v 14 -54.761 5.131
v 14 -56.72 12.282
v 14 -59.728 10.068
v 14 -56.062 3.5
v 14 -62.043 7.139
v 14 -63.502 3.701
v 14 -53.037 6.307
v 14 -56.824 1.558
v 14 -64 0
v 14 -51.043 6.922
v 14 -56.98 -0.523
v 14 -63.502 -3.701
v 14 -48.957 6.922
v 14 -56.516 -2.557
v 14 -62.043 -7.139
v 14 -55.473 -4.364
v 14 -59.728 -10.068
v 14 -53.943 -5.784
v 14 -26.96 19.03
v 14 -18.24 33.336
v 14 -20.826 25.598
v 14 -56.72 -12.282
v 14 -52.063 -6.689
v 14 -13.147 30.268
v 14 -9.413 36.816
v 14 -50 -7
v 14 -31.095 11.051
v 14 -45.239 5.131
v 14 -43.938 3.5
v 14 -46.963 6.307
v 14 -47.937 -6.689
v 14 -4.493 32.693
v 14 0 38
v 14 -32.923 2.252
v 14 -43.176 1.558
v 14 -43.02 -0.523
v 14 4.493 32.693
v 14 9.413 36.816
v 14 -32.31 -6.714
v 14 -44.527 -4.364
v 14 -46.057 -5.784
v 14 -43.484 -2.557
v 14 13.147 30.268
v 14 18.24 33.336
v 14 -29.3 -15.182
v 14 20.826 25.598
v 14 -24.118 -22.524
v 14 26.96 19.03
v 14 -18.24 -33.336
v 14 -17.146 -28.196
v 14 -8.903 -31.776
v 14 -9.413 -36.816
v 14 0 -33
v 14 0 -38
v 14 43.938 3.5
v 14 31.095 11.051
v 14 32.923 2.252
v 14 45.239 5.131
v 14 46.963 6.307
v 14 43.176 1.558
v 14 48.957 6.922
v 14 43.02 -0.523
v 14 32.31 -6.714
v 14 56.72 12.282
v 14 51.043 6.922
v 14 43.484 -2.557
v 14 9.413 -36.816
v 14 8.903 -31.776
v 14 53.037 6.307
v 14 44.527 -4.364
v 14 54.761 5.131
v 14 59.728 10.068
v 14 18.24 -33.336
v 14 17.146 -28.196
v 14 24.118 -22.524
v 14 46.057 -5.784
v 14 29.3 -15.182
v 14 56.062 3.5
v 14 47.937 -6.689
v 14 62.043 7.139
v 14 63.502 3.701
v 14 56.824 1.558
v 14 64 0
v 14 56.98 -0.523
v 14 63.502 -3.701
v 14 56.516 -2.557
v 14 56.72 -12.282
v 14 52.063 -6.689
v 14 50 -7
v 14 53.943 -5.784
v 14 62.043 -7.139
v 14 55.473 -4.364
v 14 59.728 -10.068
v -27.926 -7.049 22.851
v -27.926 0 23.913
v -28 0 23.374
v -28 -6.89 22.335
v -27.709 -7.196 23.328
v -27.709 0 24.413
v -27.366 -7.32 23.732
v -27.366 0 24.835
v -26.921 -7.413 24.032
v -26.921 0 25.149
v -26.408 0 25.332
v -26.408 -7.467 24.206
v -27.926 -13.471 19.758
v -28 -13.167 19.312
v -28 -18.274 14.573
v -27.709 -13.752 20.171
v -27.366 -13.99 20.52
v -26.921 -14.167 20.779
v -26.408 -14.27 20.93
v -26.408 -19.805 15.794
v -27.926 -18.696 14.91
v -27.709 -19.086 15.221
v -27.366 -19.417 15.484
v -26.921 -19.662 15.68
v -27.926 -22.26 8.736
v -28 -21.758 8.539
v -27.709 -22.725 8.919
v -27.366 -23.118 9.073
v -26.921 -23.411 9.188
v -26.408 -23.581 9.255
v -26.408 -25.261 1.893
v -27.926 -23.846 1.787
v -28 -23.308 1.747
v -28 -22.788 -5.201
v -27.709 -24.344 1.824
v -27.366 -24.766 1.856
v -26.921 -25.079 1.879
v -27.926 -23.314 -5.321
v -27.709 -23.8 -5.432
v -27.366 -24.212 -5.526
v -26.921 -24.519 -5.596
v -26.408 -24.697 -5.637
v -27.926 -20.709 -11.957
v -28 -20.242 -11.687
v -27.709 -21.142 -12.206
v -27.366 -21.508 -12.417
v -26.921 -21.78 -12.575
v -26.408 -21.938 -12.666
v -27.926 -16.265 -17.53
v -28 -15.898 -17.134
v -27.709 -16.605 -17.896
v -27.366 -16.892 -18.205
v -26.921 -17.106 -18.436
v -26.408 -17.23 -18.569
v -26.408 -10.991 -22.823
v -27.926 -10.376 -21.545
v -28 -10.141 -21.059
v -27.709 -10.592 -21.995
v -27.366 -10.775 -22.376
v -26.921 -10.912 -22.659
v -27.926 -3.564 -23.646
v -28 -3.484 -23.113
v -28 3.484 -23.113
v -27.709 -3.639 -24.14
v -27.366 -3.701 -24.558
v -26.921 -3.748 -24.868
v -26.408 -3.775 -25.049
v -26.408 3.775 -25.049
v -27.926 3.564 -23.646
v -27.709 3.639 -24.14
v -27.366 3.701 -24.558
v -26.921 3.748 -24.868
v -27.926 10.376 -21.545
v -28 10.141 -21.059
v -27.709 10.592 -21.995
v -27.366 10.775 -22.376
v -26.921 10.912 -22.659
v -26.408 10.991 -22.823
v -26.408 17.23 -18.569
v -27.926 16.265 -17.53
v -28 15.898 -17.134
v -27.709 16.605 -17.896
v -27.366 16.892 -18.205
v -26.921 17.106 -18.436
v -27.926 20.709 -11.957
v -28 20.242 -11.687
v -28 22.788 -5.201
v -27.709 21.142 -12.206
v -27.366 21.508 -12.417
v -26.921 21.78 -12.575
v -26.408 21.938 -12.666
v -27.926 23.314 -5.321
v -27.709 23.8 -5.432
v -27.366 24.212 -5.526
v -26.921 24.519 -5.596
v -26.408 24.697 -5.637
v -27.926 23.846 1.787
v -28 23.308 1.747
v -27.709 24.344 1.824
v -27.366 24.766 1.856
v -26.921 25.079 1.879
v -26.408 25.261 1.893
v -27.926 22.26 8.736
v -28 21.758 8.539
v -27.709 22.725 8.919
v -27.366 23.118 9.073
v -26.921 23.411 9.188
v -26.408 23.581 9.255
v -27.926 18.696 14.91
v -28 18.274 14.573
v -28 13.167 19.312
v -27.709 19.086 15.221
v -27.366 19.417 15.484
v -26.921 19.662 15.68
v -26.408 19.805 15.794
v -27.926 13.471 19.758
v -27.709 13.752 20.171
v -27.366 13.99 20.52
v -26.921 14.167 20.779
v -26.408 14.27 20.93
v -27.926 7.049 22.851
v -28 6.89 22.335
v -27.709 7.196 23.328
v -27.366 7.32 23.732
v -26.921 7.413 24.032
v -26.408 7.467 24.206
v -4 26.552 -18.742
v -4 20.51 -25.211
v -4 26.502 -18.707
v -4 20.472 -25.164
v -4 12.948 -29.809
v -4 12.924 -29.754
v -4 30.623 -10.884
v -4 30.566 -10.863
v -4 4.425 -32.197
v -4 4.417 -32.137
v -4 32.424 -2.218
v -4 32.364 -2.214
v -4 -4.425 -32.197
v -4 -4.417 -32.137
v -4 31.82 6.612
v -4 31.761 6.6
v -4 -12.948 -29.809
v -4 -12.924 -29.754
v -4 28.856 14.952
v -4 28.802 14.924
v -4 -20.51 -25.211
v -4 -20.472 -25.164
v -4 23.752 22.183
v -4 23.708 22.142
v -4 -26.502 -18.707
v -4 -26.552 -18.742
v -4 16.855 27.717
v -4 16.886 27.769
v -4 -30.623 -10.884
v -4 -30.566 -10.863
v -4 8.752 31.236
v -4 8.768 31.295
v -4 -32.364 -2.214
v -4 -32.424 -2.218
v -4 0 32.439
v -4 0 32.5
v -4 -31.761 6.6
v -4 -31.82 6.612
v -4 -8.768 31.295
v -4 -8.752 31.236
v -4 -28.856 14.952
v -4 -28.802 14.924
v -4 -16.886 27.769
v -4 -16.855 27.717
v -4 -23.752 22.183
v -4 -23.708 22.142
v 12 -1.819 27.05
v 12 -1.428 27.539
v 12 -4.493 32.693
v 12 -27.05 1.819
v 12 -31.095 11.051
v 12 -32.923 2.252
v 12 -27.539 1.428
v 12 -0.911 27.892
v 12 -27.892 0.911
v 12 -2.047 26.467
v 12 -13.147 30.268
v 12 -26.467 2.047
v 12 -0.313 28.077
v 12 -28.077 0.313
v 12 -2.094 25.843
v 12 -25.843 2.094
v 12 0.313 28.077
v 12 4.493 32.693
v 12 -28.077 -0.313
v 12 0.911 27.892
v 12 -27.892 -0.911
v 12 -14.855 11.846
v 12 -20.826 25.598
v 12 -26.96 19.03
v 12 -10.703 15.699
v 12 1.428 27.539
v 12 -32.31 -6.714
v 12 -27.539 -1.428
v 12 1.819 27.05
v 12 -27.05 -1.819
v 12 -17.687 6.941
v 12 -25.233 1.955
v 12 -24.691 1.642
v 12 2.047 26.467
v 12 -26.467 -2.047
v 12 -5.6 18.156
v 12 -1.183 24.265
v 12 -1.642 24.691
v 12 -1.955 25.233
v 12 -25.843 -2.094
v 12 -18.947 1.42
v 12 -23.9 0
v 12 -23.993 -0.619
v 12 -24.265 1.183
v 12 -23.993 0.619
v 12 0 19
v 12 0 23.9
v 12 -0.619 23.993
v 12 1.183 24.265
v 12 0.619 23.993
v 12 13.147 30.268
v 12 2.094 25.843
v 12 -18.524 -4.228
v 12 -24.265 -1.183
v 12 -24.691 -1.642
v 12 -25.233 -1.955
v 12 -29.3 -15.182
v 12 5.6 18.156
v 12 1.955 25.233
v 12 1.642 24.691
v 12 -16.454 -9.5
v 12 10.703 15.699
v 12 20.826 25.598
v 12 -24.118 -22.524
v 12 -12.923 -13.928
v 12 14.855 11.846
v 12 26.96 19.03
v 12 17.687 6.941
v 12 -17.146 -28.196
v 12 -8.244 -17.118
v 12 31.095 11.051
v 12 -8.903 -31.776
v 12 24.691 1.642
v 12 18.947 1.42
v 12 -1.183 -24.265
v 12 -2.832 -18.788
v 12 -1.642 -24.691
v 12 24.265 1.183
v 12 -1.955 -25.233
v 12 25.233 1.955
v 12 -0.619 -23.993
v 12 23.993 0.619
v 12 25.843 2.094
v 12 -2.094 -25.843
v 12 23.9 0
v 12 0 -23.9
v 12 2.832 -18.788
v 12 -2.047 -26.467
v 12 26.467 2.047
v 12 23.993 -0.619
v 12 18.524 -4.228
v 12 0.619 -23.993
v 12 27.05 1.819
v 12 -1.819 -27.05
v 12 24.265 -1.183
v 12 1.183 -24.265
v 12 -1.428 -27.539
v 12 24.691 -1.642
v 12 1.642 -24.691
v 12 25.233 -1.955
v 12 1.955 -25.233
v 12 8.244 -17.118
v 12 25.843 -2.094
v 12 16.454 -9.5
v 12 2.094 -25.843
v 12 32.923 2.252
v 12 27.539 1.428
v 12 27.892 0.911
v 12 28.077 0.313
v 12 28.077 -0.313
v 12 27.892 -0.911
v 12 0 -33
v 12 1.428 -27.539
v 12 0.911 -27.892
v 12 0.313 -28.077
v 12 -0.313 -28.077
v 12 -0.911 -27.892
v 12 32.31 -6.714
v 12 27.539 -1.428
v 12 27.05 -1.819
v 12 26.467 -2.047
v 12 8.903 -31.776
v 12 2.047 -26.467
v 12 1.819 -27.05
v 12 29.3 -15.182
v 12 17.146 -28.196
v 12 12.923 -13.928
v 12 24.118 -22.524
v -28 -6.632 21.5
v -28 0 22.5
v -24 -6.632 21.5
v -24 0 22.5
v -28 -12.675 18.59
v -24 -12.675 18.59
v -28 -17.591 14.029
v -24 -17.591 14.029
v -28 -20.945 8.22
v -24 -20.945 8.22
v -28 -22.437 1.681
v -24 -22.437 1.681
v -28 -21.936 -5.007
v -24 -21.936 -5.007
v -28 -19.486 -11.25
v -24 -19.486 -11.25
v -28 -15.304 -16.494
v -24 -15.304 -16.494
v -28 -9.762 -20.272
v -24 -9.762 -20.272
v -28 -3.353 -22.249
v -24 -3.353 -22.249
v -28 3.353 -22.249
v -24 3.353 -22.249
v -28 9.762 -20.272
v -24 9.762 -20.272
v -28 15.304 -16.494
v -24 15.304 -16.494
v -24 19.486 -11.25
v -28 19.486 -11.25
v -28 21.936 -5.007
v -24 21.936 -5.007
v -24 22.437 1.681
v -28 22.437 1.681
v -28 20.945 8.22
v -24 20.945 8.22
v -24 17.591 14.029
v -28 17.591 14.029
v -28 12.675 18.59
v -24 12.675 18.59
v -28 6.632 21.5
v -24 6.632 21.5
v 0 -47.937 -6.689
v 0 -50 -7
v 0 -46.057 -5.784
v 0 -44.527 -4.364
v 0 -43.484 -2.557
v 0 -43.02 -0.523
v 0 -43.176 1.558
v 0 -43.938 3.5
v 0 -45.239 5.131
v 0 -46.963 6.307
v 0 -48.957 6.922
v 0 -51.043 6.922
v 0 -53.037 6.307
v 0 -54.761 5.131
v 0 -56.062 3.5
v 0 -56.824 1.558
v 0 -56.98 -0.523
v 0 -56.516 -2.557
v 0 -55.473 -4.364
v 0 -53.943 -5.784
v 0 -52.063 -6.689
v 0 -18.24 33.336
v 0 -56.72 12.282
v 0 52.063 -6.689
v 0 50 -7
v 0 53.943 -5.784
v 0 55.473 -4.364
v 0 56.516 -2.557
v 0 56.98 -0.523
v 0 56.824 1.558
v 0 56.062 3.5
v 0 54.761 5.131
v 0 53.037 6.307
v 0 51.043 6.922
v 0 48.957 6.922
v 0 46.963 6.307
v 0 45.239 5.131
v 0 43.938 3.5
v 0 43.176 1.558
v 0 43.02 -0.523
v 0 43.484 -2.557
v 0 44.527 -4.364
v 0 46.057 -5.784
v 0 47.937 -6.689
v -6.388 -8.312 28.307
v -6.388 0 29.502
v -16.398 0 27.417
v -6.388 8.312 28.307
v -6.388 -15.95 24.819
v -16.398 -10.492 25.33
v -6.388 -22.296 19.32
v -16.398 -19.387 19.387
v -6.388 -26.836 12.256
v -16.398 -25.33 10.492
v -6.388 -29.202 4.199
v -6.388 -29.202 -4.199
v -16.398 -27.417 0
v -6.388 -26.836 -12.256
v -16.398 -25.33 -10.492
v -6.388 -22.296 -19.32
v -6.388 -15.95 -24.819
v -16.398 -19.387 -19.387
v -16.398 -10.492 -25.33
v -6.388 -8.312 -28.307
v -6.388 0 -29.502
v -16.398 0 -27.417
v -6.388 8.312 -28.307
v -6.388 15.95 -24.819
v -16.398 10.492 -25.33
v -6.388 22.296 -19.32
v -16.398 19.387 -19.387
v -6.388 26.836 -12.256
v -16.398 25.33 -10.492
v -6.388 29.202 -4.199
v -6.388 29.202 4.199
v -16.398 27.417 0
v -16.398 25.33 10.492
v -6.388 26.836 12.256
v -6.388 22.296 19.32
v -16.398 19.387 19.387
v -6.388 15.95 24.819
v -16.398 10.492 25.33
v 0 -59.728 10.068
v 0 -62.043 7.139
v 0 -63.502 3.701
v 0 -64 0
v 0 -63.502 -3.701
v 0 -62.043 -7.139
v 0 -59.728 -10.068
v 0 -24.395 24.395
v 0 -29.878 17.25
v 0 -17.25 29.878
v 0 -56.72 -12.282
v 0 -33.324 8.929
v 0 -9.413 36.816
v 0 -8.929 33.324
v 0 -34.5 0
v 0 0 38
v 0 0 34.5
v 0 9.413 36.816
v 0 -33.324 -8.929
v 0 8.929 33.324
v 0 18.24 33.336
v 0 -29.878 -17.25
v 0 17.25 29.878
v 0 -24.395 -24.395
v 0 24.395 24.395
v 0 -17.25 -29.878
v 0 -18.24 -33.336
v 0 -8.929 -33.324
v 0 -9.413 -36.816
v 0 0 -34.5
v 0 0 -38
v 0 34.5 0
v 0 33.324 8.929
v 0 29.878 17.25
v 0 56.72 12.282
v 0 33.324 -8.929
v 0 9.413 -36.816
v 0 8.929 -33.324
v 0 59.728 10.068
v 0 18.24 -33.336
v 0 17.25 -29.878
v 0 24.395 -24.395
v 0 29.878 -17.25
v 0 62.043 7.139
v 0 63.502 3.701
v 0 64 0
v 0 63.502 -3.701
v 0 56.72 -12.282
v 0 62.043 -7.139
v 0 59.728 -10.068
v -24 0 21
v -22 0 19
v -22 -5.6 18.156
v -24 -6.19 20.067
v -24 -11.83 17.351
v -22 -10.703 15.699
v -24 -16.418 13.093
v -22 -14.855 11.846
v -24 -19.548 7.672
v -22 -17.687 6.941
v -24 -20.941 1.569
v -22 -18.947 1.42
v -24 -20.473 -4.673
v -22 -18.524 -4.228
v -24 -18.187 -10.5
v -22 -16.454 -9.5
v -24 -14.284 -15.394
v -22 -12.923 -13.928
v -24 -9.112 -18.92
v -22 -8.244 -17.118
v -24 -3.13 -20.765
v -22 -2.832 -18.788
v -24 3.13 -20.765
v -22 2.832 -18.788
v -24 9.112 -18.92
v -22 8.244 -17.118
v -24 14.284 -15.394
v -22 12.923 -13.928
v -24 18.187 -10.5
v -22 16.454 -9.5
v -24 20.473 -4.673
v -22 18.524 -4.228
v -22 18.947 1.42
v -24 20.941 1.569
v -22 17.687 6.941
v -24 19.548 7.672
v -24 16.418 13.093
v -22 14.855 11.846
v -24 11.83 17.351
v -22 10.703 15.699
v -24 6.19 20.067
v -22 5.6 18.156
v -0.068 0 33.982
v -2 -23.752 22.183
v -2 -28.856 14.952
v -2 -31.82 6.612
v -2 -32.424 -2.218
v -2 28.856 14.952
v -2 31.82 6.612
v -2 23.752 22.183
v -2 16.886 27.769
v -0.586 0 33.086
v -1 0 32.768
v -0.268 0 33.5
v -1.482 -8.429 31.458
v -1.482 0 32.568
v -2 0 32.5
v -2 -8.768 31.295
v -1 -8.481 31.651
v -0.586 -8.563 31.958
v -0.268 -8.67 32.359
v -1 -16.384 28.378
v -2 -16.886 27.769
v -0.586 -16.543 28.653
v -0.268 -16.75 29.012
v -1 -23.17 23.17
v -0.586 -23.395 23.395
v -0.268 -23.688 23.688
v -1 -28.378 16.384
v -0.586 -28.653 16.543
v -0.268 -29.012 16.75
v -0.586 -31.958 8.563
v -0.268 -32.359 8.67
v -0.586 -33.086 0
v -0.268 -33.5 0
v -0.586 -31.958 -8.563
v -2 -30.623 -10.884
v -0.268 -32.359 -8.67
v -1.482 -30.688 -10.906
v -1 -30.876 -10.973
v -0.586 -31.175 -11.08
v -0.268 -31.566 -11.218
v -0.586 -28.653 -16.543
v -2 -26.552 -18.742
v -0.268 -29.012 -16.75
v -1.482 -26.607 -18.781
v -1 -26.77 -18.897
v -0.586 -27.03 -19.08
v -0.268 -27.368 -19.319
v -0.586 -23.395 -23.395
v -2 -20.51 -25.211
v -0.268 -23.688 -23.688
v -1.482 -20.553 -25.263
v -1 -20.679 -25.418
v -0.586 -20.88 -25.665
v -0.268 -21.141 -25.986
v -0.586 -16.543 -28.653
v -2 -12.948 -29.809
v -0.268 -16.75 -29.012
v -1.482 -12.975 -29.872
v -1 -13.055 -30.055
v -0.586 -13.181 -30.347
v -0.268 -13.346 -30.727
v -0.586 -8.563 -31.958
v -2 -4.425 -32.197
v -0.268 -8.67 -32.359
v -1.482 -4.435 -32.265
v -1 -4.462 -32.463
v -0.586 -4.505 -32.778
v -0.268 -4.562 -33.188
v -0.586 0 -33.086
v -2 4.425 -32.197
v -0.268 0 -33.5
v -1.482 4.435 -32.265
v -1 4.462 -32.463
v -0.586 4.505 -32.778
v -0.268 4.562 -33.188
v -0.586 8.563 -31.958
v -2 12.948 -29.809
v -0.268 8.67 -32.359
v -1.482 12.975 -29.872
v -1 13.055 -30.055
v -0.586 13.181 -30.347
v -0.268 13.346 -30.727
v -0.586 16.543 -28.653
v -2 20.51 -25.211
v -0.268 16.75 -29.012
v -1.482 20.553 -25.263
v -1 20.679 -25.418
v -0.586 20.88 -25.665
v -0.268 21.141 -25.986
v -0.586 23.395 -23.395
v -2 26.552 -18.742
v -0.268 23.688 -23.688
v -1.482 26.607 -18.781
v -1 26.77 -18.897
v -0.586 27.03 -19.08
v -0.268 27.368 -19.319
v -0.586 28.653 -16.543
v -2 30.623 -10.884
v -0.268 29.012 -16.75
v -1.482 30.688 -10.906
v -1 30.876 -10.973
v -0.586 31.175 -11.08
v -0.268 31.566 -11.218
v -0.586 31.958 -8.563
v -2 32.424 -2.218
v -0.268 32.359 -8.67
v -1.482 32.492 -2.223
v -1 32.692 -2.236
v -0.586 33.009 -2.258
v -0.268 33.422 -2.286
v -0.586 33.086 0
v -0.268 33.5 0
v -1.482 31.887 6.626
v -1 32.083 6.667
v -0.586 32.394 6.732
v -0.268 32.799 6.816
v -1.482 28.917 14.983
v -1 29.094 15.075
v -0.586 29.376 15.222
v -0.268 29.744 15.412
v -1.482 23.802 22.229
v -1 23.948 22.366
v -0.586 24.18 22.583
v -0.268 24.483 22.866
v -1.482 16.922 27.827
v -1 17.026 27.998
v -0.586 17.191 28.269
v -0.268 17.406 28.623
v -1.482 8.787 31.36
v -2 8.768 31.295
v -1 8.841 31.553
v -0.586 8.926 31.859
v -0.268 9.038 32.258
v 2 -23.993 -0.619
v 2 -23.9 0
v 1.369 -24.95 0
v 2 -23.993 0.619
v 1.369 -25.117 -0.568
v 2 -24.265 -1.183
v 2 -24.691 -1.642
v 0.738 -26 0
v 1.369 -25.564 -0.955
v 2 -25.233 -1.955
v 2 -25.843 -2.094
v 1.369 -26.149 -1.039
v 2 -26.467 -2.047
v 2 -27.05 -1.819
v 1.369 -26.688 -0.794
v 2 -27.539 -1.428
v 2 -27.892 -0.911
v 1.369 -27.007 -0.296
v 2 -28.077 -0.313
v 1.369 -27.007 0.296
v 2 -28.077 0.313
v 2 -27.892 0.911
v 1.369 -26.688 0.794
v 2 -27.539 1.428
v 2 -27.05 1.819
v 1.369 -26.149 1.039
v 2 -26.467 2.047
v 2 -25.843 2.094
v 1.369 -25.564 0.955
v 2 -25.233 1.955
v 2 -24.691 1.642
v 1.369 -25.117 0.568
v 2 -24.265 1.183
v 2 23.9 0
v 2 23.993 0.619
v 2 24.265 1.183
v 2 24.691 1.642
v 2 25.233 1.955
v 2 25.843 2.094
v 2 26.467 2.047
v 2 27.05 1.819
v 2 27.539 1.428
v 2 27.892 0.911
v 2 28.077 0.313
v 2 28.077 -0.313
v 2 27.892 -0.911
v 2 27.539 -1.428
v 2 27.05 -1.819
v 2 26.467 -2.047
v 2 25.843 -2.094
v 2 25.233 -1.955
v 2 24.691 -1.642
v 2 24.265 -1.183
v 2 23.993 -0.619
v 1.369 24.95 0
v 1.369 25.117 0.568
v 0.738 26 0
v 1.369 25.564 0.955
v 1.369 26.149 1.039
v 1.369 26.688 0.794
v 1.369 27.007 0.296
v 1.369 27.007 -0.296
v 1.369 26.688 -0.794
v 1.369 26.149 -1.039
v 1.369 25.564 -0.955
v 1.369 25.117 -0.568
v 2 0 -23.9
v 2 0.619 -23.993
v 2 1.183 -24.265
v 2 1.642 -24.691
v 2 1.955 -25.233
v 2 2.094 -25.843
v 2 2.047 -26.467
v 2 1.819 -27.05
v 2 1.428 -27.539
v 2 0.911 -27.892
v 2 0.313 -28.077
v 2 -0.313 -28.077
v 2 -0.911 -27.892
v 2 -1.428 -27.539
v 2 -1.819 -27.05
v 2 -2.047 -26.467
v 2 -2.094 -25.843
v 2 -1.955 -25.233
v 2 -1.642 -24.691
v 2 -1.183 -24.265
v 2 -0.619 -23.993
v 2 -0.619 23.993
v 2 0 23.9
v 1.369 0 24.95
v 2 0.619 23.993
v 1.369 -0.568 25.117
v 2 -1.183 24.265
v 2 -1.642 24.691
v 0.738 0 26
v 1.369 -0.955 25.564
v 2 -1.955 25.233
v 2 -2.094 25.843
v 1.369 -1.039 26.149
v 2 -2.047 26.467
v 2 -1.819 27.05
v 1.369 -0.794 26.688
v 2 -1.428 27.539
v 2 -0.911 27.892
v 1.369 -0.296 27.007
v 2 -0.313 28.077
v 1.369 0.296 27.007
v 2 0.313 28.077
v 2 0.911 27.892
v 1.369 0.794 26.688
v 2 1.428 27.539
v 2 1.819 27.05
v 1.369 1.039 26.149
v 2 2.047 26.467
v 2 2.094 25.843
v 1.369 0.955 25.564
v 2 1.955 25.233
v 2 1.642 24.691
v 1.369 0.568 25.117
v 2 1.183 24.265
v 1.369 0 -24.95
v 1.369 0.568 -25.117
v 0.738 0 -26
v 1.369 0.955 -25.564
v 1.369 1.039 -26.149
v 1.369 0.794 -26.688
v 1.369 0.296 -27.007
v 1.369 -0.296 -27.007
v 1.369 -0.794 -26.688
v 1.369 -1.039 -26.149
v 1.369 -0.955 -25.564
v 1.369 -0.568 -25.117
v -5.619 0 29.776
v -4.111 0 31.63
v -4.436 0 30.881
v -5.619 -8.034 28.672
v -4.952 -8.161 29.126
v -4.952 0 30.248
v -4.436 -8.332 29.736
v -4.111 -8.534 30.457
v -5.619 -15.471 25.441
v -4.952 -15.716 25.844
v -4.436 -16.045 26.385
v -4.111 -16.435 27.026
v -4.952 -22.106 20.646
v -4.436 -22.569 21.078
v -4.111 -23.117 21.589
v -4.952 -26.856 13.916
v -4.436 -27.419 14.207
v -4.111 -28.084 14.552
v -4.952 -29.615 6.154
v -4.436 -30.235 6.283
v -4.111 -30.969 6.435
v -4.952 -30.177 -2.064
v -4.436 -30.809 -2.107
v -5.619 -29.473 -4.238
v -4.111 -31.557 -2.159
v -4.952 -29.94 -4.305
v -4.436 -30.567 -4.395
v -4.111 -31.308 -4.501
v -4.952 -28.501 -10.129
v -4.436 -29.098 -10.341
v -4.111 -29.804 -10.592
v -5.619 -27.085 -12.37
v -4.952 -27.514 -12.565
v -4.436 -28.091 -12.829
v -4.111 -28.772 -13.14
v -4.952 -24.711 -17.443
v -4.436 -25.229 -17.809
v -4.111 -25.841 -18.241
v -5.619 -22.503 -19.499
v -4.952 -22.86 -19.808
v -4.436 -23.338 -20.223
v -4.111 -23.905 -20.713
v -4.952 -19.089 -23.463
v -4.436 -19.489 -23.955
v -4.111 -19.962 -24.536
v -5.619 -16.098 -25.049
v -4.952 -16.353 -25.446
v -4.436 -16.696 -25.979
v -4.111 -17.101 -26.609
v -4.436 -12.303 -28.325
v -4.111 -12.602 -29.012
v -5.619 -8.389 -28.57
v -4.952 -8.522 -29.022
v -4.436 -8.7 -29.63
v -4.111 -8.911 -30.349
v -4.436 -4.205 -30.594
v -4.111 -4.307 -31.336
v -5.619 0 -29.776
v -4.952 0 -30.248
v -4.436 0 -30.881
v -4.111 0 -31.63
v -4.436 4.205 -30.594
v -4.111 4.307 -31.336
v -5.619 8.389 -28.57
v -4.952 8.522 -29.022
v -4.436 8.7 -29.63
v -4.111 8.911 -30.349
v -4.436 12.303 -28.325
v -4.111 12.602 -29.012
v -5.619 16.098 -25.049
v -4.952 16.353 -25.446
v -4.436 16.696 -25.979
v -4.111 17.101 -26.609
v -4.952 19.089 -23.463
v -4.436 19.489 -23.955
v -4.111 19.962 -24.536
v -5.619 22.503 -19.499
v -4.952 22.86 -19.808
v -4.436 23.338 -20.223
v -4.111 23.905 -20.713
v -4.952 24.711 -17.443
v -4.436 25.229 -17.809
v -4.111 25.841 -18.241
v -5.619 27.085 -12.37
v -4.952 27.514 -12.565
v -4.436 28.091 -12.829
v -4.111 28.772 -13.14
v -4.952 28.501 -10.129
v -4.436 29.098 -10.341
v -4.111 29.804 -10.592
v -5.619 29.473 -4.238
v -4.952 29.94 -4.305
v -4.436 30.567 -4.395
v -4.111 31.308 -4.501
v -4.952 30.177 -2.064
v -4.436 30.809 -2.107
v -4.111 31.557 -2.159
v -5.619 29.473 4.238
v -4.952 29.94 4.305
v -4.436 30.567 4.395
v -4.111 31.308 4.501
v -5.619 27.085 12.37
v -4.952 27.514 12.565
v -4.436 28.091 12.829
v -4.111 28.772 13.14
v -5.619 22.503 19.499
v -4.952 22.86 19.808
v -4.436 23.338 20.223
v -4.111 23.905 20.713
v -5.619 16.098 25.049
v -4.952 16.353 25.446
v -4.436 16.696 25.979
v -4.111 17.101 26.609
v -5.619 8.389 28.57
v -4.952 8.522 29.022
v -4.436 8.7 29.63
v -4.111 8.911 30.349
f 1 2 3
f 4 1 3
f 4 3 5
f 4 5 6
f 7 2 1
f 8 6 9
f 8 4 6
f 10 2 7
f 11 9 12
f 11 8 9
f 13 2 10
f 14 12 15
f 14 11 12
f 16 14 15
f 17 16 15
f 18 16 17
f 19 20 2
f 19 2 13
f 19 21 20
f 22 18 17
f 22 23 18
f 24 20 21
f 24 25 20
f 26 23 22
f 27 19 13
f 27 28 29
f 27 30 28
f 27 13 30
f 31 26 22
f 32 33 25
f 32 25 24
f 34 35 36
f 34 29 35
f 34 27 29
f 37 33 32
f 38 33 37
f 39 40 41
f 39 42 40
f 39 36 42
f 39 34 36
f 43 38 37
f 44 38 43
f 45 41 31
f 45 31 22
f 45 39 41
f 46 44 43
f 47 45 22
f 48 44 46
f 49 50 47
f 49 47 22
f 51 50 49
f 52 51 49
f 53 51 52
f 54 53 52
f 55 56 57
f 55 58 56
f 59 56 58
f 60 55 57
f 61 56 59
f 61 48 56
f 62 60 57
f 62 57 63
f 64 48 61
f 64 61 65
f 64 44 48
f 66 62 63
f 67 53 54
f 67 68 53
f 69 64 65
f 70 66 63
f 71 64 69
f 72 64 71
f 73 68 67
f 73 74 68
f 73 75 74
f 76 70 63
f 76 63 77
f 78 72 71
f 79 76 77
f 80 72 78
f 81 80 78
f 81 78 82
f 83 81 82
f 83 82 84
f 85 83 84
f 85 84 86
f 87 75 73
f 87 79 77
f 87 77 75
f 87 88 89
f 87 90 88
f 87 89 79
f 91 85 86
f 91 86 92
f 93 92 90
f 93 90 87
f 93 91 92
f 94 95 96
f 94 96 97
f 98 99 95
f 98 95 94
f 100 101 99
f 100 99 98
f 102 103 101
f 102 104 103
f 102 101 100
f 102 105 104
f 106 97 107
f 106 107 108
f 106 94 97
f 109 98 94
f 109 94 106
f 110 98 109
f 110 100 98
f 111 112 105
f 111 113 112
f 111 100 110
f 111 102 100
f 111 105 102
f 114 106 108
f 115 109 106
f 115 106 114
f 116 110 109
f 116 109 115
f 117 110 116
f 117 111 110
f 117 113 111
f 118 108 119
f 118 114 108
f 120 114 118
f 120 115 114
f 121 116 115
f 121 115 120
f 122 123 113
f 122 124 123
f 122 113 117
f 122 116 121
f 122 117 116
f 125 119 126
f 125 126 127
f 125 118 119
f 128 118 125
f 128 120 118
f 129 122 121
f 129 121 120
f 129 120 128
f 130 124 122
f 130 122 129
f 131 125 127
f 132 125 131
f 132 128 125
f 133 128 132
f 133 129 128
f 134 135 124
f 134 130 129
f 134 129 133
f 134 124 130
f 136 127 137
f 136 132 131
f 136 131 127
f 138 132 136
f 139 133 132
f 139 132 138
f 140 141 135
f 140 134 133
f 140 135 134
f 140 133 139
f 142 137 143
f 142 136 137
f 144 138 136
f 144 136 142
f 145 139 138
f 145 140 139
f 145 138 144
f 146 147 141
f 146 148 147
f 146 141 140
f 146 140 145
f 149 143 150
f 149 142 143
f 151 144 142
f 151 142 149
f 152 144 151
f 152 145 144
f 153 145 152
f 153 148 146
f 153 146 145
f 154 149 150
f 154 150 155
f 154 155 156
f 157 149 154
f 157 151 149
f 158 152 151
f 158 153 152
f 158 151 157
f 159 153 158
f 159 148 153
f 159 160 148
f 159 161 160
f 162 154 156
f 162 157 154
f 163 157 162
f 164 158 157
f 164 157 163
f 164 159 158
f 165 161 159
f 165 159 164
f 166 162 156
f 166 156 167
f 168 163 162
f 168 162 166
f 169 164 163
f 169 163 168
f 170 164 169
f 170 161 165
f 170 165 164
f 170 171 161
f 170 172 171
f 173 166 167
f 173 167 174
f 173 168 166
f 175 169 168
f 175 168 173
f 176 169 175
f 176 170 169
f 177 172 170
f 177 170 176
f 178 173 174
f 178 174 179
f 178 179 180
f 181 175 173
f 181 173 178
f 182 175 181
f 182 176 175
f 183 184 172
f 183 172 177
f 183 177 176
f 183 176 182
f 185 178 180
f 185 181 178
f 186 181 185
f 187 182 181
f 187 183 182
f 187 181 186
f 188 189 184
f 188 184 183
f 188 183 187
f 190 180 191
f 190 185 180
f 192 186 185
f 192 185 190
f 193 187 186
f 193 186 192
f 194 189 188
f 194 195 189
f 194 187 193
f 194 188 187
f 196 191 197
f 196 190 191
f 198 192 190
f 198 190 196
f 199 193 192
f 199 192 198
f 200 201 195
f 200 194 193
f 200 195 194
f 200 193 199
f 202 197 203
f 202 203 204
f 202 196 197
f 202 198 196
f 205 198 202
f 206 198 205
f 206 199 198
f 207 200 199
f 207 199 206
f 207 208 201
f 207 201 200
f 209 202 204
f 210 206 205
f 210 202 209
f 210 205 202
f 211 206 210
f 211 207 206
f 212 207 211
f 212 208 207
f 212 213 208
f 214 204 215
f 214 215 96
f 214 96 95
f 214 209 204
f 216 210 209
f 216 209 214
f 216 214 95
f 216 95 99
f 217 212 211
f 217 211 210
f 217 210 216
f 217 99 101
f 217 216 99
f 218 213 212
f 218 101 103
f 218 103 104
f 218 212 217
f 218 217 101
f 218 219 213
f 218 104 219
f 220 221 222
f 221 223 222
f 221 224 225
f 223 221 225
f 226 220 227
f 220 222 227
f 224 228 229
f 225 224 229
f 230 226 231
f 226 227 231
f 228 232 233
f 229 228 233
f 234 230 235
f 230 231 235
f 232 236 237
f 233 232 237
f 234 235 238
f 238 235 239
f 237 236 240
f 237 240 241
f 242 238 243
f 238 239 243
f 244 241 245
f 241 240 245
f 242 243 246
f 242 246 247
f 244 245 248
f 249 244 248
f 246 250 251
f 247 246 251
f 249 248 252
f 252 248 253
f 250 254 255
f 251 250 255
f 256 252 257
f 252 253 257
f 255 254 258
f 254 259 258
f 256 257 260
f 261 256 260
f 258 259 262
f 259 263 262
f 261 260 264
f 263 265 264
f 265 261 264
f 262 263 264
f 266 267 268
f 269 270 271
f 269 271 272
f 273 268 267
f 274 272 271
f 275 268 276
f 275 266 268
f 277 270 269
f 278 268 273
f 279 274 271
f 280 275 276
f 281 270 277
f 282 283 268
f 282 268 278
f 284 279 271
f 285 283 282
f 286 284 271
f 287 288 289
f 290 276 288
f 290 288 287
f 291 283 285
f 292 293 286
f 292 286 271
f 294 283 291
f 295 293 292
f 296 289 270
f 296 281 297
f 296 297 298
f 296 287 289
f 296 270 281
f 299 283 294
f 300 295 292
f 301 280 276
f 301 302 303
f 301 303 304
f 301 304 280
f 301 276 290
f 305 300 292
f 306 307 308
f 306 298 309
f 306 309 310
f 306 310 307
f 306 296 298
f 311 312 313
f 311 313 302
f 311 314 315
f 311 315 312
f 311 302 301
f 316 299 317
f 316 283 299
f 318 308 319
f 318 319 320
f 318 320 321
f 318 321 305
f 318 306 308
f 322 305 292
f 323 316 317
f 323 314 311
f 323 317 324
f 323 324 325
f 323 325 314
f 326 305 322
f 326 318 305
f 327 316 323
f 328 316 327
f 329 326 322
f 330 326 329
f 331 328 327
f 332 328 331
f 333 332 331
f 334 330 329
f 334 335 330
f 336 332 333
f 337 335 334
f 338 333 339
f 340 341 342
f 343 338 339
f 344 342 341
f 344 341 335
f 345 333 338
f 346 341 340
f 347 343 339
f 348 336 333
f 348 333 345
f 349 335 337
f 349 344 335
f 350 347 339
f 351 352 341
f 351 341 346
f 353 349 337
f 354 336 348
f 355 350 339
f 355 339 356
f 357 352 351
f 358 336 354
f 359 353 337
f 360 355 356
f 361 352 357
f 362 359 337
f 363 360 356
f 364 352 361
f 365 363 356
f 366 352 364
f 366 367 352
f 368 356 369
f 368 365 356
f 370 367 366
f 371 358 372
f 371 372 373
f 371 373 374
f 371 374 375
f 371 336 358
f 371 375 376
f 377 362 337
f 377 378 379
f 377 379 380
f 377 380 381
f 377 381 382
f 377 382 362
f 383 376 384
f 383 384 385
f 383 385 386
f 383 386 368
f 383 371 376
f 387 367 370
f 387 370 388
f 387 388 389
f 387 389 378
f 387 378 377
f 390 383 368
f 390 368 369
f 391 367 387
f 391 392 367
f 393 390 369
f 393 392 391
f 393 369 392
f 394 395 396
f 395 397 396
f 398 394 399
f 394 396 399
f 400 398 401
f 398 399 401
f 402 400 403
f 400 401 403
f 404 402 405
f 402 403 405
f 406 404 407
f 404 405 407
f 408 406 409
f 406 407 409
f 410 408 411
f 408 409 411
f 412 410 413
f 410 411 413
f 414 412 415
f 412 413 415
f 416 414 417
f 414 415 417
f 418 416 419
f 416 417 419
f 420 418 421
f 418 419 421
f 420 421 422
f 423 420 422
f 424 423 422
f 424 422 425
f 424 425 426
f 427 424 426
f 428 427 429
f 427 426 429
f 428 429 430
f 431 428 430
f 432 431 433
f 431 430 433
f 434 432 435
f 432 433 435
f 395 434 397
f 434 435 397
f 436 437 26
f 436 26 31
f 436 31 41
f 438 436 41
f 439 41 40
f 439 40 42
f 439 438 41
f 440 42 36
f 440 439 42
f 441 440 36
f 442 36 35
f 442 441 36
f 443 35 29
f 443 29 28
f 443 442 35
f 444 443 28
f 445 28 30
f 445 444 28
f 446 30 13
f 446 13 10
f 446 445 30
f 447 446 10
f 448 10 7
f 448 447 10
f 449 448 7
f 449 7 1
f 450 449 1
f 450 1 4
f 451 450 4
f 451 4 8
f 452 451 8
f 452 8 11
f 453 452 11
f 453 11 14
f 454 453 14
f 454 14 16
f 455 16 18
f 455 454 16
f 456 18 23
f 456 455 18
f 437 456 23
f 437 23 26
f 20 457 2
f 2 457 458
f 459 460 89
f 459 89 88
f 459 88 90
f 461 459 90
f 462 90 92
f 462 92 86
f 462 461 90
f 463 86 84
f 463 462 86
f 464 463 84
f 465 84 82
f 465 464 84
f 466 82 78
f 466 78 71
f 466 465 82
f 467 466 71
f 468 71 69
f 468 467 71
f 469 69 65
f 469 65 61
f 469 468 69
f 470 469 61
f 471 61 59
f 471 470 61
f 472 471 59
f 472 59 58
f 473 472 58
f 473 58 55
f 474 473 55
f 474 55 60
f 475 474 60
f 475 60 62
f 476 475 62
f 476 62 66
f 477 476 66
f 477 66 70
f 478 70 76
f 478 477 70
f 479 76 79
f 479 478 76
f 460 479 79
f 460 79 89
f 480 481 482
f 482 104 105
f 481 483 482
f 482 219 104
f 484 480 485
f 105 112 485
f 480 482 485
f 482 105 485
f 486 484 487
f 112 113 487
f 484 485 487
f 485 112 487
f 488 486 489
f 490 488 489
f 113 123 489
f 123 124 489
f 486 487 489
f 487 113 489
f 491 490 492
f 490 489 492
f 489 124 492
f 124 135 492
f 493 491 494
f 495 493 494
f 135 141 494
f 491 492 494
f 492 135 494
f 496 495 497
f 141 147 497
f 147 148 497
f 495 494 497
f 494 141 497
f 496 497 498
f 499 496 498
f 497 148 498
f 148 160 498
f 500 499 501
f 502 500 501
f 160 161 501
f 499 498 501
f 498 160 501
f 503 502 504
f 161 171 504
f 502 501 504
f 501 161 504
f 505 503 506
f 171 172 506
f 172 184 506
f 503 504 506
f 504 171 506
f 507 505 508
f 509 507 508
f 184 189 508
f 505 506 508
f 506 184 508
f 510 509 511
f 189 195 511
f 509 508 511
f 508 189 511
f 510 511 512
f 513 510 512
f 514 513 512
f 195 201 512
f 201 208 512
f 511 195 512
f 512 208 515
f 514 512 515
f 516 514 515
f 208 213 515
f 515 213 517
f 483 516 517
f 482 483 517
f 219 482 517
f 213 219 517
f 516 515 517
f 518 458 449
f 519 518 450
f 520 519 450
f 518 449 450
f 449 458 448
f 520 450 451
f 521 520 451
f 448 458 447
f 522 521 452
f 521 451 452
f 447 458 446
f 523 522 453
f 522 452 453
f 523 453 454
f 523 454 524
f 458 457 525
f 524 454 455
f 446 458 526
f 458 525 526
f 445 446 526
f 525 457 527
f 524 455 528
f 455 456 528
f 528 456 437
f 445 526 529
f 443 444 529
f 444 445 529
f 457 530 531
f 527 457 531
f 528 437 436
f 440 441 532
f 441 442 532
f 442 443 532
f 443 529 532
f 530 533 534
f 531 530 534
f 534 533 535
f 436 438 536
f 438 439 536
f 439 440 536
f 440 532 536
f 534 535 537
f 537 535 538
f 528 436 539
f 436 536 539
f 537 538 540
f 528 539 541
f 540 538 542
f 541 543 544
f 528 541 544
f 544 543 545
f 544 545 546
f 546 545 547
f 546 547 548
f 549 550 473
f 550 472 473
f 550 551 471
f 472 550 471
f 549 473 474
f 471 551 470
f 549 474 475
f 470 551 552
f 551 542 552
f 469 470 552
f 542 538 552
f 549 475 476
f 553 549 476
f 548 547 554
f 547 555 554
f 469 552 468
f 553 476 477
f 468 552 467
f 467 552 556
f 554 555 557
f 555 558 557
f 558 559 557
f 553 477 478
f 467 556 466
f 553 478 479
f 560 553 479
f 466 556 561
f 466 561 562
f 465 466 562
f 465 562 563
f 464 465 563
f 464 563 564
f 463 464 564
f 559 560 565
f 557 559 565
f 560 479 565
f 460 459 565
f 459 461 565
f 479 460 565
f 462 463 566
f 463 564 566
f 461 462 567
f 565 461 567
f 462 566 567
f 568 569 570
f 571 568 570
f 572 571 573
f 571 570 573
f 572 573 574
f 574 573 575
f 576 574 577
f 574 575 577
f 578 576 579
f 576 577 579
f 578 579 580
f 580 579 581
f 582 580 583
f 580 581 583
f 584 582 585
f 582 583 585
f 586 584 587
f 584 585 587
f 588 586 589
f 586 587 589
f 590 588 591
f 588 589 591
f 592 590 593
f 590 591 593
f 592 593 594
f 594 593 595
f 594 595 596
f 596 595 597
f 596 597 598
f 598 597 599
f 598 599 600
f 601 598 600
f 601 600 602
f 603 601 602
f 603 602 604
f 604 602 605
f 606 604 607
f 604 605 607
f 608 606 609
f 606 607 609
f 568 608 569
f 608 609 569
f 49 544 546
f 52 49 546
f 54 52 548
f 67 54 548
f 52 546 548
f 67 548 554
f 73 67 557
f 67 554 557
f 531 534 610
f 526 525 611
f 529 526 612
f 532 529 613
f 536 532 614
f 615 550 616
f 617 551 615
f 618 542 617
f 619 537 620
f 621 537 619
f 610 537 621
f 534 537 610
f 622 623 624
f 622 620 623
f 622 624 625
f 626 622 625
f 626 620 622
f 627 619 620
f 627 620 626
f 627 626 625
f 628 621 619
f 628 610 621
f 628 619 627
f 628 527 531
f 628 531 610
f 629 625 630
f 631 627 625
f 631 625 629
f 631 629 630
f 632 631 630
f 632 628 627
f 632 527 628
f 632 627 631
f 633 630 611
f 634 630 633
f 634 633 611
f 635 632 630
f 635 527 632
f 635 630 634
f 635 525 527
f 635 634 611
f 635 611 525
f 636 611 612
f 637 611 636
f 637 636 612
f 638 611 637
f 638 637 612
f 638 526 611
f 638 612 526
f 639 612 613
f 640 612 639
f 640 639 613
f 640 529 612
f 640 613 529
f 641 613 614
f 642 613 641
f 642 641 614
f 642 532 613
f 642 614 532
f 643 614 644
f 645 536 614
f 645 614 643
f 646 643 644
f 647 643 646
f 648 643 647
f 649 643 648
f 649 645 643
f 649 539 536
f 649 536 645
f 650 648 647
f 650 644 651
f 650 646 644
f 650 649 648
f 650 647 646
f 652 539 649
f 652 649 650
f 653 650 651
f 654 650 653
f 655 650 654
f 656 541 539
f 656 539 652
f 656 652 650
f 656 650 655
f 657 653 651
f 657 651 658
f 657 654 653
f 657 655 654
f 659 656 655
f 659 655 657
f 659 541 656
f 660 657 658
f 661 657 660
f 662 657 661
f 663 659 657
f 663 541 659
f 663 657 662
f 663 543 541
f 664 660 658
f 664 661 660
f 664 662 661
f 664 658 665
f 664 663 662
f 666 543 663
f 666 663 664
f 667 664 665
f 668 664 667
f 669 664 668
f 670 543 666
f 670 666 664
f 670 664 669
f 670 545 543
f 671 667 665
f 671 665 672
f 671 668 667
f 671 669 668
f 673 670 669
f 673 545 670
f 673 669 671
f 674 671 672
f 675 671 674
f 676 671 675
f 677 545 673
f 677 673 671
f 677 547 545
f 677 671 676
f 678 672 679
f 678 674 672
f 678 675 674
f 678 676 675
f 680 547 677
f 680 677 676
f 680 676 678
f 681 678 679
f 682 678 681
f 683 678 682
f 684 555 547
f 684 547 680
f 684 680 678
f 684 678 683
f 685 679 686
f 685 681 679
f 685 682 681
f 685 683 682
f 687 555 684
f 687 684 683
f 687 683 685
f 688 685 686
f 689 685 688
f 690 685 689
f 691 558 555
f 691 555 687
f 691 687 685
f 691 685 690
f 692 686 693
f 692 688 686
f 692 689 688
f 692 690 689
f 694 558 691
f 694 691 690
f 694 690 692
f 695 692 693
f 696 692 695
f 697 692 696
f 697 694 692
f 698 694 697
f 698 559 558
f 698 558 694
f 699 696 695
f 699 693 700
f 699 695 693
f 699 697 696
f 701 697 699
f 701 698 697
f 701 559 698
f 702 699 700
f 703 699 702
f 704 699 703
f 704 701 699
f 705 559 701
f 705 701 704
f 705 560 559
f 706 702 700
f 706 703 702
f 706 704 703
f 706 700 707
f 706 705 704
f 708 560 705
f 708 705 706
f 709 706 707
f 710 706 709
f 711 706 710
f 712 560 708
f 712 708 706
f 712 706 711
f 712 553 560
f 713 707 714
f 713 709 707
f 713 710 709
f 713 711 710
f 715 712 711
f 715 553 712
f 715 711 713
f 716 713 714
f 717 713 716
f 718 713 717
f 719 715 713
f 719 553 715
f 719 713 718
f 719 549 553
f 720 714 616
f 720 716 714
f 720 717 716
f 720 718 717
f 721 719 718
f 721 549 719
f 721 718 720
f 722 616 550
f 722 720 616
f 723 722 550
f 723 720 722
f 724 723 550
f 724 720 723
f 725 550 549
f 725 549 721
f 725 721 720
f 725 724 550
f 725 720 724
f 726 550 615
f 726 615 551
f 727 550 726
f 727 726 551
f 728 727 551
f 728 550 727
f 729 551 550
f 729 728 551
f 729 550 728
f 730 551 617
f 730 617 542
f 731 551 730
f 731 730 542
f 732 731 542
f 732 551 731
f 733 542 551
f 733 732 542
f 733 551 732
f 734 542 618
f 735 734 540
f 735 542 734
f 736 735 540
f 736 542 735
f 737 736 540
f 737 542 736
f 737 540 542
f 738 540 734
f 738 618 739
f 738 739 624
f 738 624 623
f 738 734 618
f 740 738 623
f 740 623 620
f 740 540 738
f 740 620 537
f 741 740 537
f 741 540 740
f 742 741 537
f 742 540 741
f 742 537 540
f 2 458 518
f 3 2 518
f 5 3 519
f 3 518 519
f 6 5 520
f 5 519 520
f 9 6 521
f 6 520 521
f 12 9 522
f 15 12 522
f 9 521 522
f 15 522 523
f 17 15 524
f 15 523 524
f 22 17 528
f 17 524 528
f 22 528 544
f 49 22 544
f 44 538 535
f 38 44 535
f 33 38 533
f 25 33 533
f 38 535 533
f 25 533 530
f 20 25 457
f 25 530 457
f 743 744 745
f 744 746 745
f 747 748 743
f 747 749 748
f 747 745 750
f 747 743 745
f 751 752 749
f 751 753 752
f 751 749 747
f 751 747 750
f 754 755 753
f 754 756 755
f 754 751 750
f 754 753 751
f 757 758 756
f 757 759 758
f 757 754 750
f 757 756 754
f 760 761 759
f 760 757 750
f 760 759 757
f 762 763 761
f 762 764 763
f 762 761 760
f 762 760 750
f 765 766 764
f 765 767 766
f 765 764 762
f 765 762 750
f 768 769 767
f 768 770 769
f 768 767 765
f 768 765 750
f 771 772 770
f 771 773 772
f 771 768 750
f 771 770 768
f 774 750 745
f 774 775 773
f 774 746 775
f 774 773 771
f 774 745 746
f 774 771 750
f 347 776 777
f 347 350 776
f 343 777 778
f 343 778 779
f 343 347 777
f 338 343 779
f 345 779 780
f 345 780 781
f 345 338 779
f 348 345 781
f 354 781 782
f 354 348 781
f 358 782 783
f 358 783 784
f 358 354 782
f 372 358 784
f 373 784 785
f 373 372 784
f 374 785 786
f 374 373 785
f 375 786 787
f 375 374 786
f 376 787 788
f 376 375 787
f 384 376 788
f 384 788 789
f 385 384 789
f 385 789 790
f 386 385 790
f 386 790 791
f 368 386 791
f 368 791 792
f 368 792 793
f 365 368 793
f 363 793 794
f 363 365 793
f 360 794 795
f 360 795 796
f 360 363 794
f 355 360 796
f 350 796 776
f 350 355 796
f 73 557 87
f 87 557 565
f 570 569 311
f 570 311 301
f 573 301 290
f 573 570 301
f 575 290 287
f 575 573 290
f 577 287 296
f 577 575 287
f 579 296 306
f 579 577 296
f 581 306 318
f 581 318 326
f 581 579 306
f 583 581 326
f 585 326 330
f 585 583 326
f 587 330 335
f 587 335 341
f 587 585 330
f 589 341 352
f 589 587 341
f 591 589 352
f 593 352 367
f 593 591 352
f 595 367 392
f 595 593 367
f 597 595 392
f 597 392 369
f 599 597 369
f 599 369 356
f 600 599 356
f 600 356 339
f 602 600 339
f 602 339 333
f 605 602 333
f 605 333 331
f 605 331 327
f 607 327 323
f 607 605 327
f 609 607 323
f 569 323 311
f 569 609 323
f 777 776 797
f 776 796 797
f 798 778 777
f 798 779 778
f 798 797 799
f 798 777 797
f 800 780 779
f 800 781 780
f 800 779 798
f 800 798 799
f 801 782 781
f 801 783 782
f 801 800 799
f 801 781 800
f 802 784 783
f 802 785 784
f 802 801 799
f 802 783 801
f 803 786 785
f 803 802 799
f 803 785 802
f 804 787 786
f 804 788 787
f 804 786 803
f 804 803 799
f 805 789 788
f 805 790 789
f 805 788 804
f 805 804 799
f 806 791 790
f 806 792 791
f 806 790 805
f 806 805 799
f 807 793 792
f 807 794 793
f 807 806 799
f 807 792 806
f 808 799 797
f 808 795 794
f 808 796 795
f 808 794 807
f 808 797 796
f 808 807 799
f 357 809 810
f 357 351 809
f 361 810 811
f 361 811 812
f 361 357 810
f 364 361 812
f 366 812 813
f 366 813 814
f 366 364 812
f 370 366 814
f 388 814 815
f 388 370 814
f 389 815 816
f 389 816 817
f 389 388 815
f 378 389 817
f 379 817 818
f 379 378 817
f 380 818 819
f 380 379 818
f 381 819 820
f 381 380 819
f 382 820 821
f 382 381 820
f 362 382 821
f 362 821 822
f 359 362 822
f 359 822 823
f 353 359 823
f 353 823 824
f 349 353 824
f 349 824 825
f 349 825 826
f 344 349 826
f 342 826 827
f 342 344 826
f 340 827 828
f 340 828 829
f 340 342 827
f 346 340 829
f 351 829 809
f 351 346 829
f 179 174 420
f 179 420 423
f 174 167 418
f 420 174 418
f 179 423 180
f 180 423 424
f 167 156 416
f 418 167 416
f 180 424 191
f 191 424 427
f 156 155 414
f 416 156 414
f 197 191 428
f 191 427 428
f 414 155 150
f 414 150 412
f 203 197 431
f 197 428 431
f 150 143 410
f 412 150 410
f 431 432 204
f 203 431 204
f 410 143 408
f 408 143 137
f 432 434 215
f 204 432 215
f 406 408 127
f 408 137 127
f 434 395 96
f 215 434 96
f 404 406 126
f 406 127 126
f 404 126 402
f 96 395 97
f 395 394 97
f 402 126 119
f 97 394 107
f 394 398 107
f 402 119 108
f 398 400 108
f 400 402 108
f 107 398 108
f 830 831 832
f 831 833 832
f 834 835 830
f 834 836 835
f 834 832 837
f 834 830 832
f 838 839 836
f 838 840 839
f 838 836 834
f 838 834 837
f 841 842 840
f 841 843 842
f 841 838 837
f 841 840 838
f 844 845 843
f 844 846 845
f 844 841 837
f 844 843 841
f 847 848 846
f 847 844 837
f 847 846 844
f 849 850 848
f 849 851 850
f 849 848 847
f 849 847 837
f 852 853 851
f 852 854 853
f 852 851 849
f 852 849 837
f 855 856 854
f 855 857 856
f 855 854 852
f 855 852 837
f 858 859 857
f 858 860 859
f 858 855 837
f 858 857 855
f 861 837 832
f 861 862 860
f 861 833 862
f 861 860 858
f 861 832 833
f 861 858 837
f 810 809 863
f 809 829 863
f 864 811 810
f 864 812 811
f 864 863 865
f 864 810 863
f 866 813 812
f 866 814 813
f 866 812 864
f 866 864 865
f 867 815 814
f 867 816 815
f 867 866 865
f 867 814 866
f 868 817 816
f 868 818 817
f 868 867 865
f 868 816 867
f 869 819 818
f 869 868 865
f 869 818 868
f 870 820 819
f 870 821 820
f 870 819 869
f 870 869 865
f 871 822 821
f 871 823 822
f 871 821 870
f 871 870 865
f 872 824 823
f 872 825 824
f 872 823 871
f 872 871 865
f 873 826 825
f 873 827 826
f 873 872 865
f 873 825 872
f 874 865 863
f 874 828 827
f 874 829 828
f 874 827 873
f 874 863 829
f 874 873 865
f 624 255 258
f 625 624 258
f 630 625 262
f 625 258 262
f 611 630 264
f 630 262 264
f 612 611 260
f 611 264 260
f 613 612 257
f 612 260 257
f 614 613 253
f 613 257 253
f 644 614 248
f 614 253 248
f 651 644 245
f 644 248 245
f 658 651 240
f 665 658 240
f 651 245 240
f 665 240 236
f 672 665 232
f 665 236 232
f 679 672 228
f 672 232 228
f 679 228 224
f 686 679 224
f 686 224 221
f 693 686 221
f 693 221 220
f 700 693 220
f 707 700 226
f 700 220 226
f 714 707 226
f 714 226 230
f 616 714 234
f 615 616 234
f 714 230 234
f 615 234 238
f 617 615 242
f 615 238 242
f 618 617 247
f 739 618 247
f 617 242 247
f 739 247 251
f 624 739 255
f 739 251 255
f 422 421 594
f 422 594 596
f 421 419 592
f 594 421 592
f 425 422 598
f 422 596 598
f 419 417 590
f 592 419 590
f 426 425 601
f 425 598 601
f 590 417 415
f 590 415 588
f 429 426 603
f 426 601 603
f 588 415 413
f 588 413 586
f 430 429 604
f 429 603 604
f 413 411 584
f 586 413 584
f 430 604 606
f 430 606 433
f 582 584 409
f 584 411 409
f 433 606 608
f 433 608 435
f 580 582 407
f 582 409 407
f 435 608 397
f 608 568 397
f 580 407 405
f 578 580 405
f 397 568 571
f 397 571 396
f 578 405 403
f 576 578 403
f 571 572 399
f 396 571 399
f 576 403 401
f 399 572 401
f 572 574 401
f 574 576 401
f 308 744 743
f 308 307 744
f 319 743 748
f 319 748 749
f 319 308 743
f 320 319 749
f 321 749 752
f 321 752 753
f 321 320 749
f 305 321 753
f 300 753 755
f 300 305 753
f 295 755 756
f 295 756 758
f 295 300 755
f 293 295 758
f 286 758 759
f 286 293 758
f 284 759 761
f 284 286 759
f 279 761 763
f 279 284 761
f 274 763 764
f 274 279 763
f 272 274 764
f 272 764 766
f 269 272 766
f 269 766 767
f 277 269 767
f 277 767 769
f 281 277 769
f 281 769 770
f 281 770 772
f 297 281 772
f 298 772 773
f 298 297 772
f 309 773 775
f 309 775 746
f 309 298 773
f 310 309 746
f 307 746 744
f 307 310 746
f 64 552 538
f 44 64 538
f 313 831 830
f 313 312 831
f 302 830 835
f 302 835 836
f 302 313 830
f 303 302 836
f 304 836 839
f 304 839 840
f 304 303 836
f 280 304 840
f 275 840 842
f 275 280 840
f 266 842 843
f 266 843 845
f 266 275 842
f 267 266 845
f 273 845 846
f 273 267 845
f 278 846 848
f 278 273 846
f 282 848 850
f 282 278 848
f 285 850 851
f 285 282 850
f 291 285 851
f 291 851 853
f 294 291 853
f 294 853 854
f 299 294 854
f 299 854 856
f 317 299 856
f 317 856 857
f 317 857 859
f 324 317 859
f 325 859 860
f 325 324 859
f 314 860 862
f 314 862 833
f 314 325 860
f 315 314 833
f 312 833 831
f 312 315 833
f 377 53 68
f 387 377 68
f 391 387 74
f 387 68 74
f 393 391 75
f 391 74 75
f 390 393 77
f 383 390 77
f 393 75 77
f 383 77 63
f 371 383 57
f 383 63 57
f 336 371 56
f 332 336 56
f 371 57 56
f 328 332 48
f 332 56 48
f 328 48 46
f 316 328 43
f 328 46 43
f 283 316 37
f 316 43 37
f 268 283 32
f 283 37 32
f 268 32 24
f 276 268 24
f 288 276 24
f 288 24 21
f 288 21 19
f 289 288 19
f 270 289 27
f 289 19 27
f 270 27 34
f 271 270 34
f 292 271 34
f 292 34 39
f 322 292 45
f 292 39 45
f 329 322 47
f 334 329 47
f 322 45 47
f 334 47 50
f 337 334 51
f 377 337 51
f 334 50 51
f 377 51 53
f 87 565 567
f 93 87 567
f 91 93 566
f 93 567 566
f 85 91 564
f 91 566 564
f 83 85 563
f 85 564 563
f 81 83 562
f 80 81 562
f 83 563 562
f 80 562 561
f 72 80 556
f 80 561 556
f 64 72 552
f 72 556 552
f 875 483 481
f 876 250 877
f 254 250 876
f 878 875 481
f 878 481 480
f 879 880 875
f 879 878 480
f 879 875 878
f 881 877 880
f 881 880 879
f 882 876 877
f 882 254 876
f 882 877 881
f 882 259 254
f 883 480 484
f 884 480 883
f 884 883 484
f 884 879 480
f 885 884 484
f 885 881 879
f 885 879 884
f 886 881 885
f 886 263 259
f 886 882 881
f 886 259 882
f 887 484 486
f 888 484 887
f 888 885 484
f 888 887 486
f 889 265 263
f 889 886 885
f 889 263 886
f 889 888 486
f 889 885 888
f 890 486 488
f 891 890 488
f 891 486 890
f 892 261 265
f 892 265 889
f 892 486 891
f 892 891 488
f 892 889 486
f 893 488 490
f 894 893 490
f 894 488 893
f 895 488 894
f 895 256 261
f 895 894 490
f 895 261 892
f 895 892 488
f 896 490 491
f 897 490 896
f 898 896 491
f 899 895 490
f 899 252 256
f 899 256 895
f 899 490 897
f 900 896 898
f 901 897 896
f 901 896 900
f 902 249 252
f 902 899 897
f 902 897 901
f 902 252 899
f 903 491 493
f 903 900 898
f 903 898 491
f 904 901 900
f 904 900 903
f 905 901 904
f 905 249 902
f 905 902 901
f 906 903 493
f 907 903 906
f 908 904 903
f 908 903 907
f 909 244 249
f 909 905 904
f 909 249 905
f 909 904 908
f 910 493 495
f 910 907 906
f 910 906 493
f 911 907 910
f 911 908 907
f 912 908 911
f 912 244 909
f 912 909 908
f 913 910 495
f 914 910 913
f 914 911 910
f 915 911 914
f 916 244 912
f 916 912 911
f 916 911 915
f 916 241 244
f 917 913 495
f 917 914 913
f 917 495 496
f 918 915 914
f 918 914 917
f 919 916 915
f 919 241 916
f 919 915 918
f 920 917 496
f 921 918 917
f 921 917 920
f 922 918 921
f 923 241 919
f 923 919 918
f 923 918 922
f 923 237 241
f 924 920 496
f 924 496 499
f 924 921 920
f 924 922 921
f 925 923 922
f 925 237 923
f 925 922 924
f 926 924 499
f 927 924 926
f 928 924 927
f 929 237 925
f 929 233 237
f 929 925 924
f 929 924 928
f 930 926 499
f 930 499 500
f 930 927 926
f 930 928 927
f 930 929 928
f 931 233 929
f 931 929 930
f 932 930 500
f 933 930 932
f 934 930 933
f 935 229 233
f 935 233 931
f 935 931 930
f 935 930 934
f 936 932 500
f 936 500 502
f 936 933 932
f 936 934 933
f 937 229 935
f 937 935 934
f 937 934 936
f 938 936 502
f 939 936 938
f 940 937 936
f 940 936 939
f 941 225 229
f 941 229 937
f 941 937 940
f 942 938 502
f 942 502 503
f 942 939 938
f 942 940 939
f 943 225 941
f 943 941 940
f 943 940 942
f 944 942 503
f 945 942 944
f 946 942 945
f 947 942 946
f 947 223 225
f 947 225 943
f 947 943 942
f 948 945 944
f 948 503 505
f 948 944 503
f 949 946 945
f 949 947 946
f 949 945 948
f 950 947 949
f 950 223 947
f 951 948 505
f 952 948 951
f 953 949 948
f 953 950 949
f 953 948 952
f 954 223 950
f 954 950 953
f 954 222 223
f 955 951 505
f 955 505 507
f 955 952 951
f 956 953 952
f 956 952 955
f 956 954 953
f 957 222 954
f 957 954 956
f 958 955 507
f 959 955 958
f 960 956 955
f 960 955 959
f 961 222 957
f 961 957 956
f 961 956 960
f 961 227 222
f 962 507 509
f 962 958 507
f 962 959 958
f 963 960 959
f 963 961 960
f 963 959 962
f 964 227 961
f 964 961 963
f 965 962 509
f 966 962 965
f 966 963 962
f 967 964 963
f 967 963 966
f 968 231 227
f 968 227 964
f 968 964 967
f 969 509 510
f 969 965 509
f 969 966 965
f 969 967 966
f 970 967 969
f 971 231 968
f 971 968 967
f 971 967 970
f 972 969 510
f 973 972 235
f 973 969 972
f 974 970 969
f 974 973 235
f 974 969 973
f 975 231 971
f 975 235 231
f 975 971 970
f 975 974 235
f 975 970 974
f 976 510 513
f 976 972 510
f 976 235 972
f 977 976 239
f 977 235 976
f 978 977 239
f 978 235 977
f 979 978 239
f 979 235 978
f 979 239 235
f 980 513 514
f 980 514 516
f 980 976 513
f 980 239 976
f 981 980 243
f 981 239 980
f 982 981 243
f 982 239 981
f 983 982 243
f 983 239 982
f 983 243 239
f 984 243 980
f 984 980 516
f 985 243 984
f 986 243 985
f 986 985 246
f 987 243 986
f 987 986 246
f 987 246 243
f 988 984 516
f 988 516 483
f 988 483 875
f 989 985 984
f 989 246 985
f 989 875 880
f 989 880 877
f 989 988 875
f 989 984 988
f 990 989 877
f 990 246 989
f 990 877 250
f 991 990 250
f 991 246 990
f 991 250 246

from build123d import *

# Parameters (mm, degrees)
SKICA2_R                 = 19
SKICA2_R_2               = 7
P_IDAT_VYSUNUT_M1_DEPTH  = 14
ZAOBLIT1_R               = 3
SKICA3_R                 = 33
SKICA3_R_2               = 19
ODEBRAT_VYSUNUT_M1_DEPTH = 2
ZKOSEN_1_SIZE            = 2
ZAOBLIT2_R               = 2
KRUHOV_POLE1_COUNT       = 4


with BuildPart() as part:
    # Skica1 → Rotovat1 (revolve)
    with BuildSketch(Plane.XY, mode=Mode.PRIVATE) as rotovat1_sk:
        Polygon((0, 19), (0, 32.5), (-4, 32.5), (-4, 30), (-28, 25), (-28, 22.5), (-24, 22.5), (-24, 19), align=None)
    revolve(rotovat1_sk.sketch.rotate(Axis((-37.430213862, 0, 0), (1, 0, 0)), 90), axis=Axis((-37.430213862, 0, 0), (1, 0, 0)))

    # Skica2 → Přidat vysunutím1 (add)
    with BuildSketch(Plane(origin=(0, 0, 0), x_dir=(0, 0, -1), z_dir=(1, 0, 0))):
        with BuildLine():
            Line((-33.336202543, -18.24), (-12.281758832, -56.72))
            ThreePointArc((-12.281758832, -56.72), (0, -64), (12.281758832, -56.72))
            Line((12.281758832, -56.72), (33.336202543, -18.24))
            ThreePointArc((33.336202543, -18.24), (38, 0), (33.336202543, 18.24))
            Line((33.336202543, 18.24), (12.281758832, 56.72))
            ThreePointArc((12.281758832, 56.72), (0, 64), (-12.281758832, 56.72))
            Line((-12.281758832, 56.72), (-33.336202543, 18.24))
            ThreePointArc((-33.336202543, 18.24), (-38, 0), (-33.336202543, -18.24))
        make_face()
        with Locations(Location((0, 0, 0), (0, 0, 180))):
            Circle(SKICA2_R, mode=Mode.SUBTRACT)
        with Locations((0, 50)):
            Circle(SKICA2_R_2, mode=Mode.SUBTRACT)
        with Locations((0, -50)):
            Circle(SKICA2_R_2, mode=Mode.SUBTRACT)
    extrude(amount=P_IDAT_VYSUNUT_M1_DEPTH)

    # Zaoblit1
    zaoblit1_edges = [part.edges().sort_by_distance(p)[0] for p in [
        (-4, 0, -30),
    ]]
    fillet(zaoblit1_edges, radius=ZAOBLIT1_R)

    # Skica3 → Odebrat vysunutím1 (cut)
    with BuildSketch(Plane(origin=(14, 0, 0), x_dir=(0, 0, -1), z_dir=(1, 0, 0))):
        Circle(SKICA3_R)
        with Locations(Location((0, 0, 0), (0, 0, 180))):
            Circle(SKICA3_R_2, mode=Mode.SUBTRACT)
    extrude(amount=-ODEBRAT_VYSUNUT_M1_DEPTH, mode=Mode.SUBTRACT)

    # Zkosení1
    zkosen_1_edges = [part.edges().sort_by_distance(p)[0] for p in [
        (-24, 0, -19),
    ]]
    chamfer(zkosen_1_edges, length=ZKOSEN_1_SIZE)

    # Zaoblit2
    zaoblit2_edges = [part.edges().sort_by_distance(p)[0] for p in [
        (0, 0, -32.5),
        (-28, 0, -25),
    ]]
    fillet(zaoblit2_edges, radius=ZAOBLIT2_R)

    # Skica6 → M5 závit1 (revolve, cut)
    with BuildSketch(Plane(origin=(12, 0, 26), x_dir=(0, 0, -1), z_dir=(0, 1, 0))):
        Polygon((0, 0), (0, 11.2618073), (2.1, 10), (2.1, 0), align=None)
    m5_z_vit1 = revolve(axis=Axis((18.35, 0, 26), (-1, 0, 0)), mode=Mode.SUBTRACT)

    # Kruhové pole1: M5 závit1 ×4 about axis
    kruhov_pole1_axis = Axis((0, 0, 0), (1, 0, 0))
    for i in range(1, KRUHOV_POLE1_COUNT):
        add(m5_z_vit1.rotate(kruhov_pole1_axis, i * 360 / KRUHOV_POLE1_COUNT), mode=Mode.SUBTRACT)


solid = part.part
